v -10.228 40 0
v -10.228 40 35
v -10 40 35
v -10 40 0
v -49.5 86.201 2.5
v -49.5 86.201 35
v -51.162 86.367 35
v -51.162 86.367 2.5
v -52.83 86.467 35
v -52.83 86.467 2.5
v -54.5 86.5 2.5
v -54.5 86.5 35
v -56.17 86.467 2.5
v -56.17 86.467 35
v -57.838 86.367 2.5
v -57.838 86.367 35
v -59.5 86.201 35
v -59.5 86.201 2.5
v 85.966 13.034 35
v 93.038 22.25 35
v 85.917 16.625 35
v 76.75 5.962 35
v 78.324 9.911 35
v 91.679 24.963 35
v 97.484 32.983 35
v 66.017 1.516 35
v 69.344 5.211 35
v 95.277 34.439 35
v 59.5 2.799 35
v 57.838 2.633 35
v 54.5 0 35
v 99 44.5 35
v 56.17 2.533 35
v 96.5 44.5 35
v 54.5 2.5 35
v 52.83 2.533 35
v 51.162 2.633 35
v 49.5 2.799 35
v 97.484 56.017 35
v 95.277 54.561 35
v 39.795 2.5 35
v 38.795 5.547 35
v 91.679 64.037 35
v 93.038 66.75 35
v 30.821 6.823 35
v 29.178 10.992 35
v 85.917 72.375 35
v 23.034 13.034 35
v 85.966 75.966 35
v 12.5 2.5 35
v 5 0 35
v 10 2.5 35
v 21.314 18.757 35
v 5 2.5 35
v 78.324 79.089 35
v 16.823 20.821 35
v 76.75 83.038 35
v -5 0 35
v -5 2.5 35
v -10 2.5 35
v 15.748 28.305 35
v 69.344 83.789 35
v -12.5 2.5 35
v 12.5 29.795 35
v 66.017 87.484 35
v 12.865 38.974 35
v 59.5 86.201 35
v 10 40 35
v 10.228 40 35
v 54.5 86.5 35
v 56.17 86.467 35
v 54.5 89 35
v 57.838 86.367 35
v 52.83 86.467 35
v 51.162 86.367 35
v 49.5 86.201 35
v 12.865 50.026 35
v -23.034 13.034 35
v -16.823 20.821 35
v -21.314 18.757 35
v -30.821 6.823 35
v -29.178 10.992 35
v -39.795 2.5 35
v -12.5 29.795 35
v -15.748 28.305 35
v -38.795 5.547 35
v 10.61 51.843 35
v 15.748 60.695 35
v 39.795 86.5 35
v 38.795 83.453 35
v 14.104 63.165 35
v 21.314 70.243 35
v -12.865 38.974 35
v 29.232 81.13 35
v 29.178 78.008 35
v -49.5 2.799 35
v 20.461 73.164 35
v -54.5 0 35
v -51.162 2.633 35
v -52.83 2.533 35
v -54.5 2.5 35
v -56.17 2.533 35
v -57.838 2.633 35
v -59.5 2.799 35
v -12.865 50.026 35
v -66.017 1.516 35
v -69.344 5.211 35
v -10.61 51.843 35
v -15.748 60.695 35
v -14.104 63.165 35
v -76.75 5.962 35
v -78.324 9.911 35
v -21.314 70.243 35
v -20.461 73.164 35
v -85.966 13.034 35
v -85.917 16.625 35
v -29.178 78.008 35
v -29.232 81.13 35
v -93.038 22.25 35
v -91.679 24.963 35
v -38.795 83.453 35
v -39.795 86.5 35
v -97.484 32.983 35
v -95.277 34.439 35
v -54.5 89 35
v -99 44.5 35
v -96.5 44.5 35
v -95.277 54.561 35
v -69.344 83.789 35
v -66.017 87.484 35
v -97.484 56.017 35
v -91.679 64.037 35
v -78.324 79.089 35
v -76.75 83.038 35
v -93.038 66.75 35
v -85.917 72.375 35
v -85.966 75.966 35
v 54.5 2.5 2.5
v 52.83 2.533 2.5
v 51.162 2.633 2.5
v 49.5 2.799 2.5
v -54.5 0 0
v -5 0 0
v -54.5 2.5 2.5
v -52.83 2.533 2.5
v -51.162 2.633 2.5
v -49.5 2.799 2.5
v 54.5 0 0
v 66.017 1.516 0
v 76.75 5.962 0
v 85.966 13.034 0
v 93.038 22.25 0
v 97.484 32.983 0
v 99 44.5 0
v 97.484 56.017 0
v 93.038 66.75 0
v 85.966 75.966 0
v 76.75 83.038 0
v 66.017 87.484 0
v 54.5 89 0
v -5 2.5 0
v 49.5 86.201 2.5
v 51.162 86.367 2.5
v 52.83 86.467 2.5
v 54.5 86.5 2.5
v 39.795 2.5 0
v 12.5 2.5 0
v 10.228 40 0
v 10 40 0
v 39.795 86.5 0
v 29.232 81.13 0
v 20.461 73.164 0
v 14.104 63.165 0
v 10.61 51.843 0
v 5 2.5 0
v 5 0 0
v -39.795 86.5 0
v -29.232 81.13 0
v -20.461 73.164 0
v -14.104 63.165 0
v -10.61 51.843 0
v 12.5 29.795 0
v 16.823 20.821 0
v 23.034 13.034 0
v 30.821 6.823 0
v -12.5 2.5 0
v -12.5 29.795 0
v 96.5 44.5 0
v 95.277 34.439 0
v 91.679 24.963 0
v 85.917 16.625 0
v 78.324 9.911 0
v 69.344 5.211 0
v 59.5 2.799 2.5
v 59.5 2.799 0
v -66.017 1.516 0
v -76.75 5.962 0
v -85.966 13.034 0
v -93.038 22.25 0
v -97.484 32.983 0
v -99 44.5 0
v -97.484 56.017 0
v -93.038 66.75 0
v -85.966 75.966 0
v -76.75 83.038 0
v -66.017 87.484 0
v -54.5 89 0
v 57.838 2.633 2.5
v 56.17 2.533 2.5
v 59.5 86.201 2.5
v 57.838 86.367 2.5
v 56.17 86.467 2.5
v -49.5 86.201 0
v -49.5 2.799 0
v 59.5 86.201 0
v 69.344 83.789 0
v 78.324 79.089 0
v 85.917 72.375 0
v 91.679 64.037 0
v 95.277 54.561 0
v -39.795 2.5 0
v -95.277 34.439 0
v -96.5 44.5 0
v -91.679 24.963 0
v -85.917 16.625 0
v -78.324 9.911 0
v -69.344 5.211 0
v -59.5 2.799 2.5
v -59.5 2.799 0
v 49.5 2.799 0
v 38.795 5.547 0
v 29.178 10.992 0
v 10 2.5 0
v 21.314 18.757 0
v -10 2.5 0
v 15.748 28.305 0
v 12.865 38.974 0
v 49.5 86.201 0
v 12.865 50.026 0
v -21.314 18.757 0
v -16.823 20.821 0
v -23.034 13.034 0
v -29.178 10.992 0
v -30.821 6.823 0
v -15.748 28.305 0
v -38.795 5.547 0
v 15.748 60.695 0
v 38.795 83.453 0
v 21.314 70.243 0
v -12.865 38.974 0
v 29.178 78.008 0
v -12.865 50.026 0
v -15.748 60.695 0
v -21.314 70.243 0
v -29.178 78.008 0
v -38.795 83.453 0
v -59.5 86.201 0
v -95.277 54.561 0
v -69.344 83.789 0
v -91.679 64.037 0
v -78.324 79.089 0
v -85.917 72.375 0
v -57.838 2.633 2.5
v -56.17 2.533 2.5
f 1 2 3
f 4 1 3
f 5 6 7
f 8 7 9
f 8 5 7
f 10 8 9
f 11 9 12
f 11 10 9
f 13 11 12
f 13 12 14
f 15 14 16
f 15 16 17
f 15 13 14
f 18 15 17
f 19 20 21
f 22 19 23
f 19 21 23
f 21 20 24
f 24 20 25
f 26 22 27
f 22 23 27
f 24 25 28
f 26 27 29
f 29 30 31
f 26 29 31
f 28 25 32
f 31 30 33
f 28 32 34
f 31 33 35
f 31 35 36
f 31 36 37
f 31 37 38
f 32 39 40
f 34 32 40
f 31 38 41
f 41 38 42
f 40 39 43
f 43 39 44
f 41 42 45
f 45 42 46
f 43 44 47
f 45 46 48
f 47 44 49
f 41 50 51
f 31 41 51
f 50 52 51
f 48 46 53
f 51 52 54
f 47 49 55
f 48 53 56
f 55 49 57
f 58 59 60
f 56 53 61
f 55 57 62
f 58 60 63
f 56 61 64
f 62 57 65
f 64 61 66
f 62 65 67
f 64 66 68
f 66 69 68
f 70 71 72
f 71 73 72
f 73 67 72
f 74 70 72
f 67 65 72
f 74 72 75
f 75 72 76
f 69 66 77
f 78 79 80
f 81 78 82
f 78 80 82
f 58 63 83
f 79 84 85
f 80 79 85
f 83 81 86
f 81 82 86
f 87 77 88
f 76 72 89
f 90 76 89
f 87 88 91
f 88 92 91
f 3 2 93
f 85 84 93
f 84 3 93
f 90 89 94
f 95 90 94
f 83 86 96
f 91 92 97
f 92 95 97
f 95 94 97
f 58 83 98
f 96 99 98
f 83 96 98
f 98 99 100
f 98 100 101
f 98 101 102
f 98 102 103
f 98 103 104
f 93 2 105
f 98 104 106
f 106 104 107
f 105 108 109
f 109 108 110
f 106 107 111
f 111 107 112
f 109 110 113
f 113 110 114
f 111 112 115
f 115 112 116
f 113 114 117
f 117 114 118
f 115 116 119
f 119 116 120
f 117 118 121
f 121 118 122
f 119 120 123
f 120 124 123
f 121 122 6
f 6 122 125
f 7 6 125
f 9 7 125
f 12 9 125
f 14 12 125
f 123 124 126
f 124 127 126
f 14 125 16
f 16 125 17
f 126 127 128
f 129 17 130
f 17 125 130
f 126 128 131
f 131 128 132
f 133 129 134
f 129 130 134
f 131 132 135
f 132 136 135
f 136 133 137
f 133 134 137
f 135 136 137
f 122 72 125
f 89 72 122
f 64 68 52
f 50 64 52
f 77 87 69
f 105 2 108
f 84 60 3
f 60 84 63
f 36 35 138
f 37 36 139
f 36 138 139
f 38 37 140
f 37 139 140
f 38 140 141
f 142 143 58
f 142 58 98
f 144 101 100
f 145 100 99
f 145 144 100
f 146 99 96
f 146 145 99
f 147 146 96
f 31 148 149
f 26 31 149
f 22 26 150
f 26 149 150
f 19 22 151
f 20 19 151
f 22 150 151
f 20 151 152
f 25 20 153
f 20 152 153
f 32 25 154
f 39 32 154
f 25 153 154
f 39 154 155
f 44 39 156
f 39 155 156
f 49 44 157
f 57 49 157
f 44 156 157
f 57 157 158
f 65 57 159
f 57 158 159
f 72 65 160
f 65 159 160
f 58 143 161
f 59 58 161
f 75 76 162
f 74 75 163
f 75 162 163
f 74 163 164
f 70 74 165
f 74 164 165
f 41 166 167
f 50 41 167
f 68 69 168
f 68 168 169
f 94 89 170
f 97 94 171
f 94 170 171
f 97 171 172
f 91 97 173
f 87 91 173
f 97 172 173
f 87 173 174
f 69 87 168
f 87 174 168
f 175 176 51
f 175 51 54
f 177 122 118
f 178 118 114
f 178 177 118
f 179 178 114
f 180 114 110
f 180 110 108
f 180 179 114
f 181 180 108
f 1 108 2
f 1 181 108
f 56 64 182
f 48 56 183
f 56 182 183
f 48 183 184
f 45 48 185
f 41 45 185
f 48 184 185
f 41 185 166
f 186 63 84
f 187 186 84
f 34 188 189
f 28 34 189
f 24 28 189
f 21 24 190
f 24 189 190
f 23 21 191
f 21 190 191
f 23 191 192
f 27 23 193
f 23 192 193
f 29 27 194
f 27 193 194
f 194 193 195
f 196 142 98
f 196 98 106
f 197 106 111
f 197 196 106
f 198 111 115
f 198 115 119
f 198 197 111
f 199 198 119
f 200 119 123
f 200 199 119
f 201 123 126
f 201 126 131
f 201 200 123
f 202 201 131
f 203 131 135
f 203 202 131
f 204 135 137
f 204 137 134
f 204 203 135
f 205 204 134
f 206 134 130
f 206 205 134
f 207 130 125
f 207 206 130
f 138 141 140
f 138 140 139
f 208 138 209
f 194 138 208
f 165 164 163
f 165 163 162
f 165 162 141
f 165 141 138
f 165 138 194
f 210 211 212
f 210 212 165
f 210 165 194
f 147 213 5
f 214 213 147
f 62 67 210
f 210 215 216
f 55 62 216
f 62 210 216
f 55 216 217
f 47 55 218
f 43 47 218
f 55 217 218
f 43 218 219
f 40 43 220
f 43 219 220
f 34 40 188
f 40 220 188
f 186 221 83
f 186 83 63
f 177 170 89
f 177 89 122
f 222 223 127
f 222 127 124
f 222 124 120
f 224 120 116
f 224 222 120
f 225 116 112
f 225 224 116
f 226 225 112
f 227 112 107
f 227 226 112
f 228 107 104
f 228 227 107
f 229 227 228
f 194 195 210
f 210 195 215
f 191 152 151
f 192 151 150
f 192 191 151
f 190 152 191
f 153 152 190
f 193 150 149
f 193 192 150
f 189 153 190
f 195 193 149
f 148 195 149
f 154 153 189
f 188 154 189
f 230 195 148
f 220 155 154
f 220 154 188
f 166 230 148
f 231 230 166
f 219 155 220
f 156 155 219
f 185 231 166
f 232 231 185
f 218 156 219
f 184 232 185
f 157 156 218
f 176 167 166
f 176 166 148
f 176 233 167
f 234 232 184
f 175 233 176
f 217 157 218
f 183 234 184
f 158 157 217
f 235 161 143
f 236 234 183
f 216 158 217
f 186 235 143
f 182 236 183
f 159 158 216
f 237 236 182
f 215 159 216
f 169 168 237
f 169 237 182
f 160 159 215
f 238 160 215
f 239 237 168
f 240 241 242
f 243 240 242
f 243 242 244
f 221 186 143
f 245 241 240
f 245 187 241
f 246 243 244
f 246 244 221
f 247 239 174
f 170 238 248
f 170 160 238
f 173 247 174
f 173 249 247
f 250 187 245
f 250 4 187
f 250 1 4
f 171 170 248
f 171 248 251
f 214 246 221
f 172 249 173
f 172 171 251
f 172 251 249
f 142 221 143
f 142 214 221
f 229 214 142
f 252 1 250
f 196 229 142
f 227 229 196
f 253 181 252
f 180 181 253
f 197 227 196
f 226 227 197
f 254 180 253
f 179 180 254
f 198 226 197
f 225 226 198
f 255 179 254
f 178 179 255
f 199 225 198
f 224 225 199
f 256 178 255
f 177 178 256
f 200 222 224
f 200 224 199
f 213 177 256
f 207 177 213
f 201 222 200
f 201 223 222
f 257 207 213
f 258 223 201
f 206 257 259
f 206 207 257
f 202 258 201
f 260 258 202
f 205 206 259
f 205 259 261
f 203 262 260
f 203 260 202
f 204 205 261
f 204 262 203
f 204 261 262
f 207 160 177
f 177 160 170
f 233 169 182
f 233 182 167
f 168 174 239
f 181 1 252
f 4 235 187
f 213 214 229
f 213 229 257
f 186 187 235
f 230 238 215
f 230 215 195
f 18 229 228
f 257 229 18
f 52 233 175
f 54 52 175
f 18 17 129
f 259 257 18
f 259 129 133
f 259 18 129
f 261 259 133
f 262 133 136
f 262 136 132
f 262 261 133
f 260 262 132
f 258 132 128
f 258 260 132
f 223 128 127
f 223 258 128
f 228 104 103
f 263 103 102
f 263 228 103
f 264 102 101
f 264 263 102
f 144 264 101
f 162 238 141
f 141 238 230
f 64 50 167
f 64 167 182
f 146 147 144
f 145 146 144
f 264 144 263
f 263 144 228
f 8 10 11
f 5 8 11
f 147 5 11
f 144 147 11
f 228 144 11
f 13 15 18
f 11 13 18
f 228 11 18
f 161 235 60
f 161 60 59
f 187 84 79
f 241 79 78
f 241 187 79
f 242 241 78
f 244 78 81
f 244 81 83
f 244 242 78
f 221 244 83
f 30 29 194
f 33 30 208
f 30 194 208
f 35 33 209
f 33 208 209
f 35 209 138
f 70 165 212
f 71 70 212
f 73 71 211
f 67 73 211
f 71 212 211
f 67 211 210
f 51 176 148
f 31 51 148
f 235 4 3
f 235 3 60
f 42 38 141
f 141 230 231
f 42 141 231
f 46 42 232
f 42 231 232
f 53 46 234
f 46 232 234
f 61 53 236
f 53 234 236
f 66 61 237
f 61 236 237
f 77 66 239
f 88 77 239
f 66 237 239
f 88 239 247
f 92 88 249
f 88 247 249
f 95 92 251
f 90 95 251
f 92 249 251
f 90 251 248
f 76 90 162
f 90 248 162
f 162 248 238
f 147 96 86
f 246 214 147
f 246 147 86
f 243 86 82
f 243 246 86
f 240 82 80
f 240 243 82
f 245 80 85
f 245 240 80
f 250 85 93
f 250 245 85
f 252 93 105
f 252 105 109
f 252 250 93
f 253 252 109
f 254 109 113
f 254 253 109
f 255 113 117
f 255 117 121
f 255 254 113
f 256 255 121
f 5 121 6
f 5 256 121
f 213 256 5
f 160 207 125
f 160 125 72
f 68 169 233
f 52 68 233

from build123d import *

# Parameters (mm, degrees)
F0_W     = 5
F0_H     = 2.5
F0_W_2   = 2.5
F1_DEPTH = 35
F2_DEPTH = 2.5


with BuildPart() as f1:
    # F0 (on Top) → F1 (new body)
    with BuildSketch(Plane.XY):
        with Locations((7.5, 1.25)):
            Rectangle(F0_W, F0_H)
        with Locations((11.25, 1.25)):
            Rectangle(F0_W_2, F0_H)
        with BuildLine():
            Line((10, 40), (10, 2.5))
            Line((10, 2.5), (12.5, 2.5))
            Line((12.5, 2.5), (12.5, 29.7945588301))
            ThreePointArc((12.5, 29.7945588301), (11.0632944452, 34.8303252101), (10.2281127576, 40))
            Line((10.2281127576, 40), (10, 40))
        make_face()
        with BuildLine():
            Line((12.5, 2.5), (12.5, 0))
            Line((12.5, 0), (54.5, 0))
            ThreePointArc((54.5, 0), (47.0417830549, 0.6294517928), (39.7945588301, 2.5))
            Line((39.7945588301, 2.5), (12.5, 2.5))
        make_face()
        with BuildLine():
            Line((39.7945588301, 2.5), (54.5, 2.5))
            ThreePointArc((54.5, 2.5), (51.9955434529, 2.574736764), (49.5, 2.798681076))
            ThreePointArc((49.5, 2.798681076), (12.5, 44.5), (49.5, 86.201318924))
            ThreePointArc((49.5, 86.201318924), (51.9955434529, 86.425263236), (54.5, 86.5))
            Line((54.5, 86.5), (39.7945588301, 86.5))
            ThreePointArc((39.7945588301, 86.5), (16.948118334, 68.3768964344), (10.2281127576, 40))
            Line((10.2281127576, 40), (12.5, 40))
            Line((12.5, 40), (12.5, 29.7945588301))
            ThreePointArc((12.5, 29.7945588301), (23.0337482372, 13.0337482372), (39.7945588301, 2.5))
        make_face()
        with BuildLine():
            ThreePointArc((10.2281127576, 40), (11.0632944452, 34.8303252101), (12.5, 29.7945588301))
            Line((12.5, 29.7945588301), (12.5, 40))
            Line((12.5, 40), (10.2281127576, 40))
        make_face()
        with BuildLine():
            ThreePointArc((39.7945588301, 2.5), (47.0417830549, 0.6294517928), (54.5, 0))
            Line((54.5, 0), (54.5, 2.5))
            Line((54.5, 2.5), (39.7945588301, 2.5))
        make_face()
        with BuildLine():
            Line((54.5, 2.5), (54.5, 0))
            ThreePointArc((54.5, 0), (85.9662517628, 13.0337482372), (99, 44.5))
            ThreePointArc((99, 44.5), (85.9662517628, 75.9662517628), (54.5, 89))
            Line((54.5, 89), (54.5, 86.5))
            ThreePointArc((54.5, 86.5), (57.0044565471, 86.425263236), (59.5, 86.201318924))
            ThreePointArc((59.5, 86.201318924), (85.9165561448, 72.3747197295), (96.5, 44.5))
            ThreePointArc((96.5, 44.5), (85.9165561448, 16.6252802705), (59.5, 2.798681076))
            ThreePointArc((59.5, 2.798681076), (57.0044565471, 2.574736764), (54.5, 2.5))
        make_face()
        with BuildLine():
            Line((54.5, 86.5), (54.5, 89))
            ThreePointArc((54.5, 89), (47.0417830549, 88.3705482072), (39.7945588301, 86.5))
            Line((39.7945588301, 86.5), (54.5, 86.5))
        make_face()
        with BuildLine():
            ThreePointArc((39.7945588301, 86.5), (47.0417830549, 88.3705482072), (54.5, 89))
            Line((54.5, 89), (0, 89))
            Line((0, 89), (0, 86.5))
            Line((0, 86.5), (39.7945588301, 86.5))
        make_face()
    extrude(amount=F1_DEPTH)

    # F0 (on Top) → F2 (join)
    with BuildSketch(Plane.XY):
        with BuildLine():
            Line((54.5, 86.5), (54.5, 44.5))
            Line((54.5, 44.5), (59.5, 44.5))
            Line((59.5, 44.5), (59.5, 86.201318924))
            ThreePointArc((59.5, 86.201318924), (57.0044565471, 86.425263236), (54.5, 86.5))
        make_face()
        with BuildLine():
            Line((49.5, 44.5), (54.5, 44.5))
            Line((54.5, 44.5), (54.5, 86.5))
            ThreePointArc((54.5, 86.5), (51.9955434529, 86.425263236), (49.5, 86.201318924))
            Line((49.5, 86.201318924), (49.5, 44.5))
        make_face()
        with BuildLine():
            ThreePointArc((49.5, 2.798681076), (51.9955434529, 2.574736764), (54.5, 2.5))
            Line((54.5, 2.5), (54.5, 44.5))
            Line((54.5, 44.5), (49.5, 44.5))
            Line((49.5, 44.5), (49.5, 2.798681076))
        make_face()
        with BuildLine():
            Line((54.5, 44.5), (54.5, 2.5))
            ThreePointArc((54.5, 2.5), (57.0044565471, 2.574736764), (59.5, 2.798681076))
            Line((59.5, 2.798681076), (59.5, 44.5))
            Line((59.5, 44.5), (54.5, 44.5))
        make_face()
    extrude(amount=F2_DEPTH)

    # F3: F1 across plane


with BuildPart() as f1_1:
    add(f1.part)
    add(f1.part.mirror(Plane.YZ))


solid = f1_1.part
